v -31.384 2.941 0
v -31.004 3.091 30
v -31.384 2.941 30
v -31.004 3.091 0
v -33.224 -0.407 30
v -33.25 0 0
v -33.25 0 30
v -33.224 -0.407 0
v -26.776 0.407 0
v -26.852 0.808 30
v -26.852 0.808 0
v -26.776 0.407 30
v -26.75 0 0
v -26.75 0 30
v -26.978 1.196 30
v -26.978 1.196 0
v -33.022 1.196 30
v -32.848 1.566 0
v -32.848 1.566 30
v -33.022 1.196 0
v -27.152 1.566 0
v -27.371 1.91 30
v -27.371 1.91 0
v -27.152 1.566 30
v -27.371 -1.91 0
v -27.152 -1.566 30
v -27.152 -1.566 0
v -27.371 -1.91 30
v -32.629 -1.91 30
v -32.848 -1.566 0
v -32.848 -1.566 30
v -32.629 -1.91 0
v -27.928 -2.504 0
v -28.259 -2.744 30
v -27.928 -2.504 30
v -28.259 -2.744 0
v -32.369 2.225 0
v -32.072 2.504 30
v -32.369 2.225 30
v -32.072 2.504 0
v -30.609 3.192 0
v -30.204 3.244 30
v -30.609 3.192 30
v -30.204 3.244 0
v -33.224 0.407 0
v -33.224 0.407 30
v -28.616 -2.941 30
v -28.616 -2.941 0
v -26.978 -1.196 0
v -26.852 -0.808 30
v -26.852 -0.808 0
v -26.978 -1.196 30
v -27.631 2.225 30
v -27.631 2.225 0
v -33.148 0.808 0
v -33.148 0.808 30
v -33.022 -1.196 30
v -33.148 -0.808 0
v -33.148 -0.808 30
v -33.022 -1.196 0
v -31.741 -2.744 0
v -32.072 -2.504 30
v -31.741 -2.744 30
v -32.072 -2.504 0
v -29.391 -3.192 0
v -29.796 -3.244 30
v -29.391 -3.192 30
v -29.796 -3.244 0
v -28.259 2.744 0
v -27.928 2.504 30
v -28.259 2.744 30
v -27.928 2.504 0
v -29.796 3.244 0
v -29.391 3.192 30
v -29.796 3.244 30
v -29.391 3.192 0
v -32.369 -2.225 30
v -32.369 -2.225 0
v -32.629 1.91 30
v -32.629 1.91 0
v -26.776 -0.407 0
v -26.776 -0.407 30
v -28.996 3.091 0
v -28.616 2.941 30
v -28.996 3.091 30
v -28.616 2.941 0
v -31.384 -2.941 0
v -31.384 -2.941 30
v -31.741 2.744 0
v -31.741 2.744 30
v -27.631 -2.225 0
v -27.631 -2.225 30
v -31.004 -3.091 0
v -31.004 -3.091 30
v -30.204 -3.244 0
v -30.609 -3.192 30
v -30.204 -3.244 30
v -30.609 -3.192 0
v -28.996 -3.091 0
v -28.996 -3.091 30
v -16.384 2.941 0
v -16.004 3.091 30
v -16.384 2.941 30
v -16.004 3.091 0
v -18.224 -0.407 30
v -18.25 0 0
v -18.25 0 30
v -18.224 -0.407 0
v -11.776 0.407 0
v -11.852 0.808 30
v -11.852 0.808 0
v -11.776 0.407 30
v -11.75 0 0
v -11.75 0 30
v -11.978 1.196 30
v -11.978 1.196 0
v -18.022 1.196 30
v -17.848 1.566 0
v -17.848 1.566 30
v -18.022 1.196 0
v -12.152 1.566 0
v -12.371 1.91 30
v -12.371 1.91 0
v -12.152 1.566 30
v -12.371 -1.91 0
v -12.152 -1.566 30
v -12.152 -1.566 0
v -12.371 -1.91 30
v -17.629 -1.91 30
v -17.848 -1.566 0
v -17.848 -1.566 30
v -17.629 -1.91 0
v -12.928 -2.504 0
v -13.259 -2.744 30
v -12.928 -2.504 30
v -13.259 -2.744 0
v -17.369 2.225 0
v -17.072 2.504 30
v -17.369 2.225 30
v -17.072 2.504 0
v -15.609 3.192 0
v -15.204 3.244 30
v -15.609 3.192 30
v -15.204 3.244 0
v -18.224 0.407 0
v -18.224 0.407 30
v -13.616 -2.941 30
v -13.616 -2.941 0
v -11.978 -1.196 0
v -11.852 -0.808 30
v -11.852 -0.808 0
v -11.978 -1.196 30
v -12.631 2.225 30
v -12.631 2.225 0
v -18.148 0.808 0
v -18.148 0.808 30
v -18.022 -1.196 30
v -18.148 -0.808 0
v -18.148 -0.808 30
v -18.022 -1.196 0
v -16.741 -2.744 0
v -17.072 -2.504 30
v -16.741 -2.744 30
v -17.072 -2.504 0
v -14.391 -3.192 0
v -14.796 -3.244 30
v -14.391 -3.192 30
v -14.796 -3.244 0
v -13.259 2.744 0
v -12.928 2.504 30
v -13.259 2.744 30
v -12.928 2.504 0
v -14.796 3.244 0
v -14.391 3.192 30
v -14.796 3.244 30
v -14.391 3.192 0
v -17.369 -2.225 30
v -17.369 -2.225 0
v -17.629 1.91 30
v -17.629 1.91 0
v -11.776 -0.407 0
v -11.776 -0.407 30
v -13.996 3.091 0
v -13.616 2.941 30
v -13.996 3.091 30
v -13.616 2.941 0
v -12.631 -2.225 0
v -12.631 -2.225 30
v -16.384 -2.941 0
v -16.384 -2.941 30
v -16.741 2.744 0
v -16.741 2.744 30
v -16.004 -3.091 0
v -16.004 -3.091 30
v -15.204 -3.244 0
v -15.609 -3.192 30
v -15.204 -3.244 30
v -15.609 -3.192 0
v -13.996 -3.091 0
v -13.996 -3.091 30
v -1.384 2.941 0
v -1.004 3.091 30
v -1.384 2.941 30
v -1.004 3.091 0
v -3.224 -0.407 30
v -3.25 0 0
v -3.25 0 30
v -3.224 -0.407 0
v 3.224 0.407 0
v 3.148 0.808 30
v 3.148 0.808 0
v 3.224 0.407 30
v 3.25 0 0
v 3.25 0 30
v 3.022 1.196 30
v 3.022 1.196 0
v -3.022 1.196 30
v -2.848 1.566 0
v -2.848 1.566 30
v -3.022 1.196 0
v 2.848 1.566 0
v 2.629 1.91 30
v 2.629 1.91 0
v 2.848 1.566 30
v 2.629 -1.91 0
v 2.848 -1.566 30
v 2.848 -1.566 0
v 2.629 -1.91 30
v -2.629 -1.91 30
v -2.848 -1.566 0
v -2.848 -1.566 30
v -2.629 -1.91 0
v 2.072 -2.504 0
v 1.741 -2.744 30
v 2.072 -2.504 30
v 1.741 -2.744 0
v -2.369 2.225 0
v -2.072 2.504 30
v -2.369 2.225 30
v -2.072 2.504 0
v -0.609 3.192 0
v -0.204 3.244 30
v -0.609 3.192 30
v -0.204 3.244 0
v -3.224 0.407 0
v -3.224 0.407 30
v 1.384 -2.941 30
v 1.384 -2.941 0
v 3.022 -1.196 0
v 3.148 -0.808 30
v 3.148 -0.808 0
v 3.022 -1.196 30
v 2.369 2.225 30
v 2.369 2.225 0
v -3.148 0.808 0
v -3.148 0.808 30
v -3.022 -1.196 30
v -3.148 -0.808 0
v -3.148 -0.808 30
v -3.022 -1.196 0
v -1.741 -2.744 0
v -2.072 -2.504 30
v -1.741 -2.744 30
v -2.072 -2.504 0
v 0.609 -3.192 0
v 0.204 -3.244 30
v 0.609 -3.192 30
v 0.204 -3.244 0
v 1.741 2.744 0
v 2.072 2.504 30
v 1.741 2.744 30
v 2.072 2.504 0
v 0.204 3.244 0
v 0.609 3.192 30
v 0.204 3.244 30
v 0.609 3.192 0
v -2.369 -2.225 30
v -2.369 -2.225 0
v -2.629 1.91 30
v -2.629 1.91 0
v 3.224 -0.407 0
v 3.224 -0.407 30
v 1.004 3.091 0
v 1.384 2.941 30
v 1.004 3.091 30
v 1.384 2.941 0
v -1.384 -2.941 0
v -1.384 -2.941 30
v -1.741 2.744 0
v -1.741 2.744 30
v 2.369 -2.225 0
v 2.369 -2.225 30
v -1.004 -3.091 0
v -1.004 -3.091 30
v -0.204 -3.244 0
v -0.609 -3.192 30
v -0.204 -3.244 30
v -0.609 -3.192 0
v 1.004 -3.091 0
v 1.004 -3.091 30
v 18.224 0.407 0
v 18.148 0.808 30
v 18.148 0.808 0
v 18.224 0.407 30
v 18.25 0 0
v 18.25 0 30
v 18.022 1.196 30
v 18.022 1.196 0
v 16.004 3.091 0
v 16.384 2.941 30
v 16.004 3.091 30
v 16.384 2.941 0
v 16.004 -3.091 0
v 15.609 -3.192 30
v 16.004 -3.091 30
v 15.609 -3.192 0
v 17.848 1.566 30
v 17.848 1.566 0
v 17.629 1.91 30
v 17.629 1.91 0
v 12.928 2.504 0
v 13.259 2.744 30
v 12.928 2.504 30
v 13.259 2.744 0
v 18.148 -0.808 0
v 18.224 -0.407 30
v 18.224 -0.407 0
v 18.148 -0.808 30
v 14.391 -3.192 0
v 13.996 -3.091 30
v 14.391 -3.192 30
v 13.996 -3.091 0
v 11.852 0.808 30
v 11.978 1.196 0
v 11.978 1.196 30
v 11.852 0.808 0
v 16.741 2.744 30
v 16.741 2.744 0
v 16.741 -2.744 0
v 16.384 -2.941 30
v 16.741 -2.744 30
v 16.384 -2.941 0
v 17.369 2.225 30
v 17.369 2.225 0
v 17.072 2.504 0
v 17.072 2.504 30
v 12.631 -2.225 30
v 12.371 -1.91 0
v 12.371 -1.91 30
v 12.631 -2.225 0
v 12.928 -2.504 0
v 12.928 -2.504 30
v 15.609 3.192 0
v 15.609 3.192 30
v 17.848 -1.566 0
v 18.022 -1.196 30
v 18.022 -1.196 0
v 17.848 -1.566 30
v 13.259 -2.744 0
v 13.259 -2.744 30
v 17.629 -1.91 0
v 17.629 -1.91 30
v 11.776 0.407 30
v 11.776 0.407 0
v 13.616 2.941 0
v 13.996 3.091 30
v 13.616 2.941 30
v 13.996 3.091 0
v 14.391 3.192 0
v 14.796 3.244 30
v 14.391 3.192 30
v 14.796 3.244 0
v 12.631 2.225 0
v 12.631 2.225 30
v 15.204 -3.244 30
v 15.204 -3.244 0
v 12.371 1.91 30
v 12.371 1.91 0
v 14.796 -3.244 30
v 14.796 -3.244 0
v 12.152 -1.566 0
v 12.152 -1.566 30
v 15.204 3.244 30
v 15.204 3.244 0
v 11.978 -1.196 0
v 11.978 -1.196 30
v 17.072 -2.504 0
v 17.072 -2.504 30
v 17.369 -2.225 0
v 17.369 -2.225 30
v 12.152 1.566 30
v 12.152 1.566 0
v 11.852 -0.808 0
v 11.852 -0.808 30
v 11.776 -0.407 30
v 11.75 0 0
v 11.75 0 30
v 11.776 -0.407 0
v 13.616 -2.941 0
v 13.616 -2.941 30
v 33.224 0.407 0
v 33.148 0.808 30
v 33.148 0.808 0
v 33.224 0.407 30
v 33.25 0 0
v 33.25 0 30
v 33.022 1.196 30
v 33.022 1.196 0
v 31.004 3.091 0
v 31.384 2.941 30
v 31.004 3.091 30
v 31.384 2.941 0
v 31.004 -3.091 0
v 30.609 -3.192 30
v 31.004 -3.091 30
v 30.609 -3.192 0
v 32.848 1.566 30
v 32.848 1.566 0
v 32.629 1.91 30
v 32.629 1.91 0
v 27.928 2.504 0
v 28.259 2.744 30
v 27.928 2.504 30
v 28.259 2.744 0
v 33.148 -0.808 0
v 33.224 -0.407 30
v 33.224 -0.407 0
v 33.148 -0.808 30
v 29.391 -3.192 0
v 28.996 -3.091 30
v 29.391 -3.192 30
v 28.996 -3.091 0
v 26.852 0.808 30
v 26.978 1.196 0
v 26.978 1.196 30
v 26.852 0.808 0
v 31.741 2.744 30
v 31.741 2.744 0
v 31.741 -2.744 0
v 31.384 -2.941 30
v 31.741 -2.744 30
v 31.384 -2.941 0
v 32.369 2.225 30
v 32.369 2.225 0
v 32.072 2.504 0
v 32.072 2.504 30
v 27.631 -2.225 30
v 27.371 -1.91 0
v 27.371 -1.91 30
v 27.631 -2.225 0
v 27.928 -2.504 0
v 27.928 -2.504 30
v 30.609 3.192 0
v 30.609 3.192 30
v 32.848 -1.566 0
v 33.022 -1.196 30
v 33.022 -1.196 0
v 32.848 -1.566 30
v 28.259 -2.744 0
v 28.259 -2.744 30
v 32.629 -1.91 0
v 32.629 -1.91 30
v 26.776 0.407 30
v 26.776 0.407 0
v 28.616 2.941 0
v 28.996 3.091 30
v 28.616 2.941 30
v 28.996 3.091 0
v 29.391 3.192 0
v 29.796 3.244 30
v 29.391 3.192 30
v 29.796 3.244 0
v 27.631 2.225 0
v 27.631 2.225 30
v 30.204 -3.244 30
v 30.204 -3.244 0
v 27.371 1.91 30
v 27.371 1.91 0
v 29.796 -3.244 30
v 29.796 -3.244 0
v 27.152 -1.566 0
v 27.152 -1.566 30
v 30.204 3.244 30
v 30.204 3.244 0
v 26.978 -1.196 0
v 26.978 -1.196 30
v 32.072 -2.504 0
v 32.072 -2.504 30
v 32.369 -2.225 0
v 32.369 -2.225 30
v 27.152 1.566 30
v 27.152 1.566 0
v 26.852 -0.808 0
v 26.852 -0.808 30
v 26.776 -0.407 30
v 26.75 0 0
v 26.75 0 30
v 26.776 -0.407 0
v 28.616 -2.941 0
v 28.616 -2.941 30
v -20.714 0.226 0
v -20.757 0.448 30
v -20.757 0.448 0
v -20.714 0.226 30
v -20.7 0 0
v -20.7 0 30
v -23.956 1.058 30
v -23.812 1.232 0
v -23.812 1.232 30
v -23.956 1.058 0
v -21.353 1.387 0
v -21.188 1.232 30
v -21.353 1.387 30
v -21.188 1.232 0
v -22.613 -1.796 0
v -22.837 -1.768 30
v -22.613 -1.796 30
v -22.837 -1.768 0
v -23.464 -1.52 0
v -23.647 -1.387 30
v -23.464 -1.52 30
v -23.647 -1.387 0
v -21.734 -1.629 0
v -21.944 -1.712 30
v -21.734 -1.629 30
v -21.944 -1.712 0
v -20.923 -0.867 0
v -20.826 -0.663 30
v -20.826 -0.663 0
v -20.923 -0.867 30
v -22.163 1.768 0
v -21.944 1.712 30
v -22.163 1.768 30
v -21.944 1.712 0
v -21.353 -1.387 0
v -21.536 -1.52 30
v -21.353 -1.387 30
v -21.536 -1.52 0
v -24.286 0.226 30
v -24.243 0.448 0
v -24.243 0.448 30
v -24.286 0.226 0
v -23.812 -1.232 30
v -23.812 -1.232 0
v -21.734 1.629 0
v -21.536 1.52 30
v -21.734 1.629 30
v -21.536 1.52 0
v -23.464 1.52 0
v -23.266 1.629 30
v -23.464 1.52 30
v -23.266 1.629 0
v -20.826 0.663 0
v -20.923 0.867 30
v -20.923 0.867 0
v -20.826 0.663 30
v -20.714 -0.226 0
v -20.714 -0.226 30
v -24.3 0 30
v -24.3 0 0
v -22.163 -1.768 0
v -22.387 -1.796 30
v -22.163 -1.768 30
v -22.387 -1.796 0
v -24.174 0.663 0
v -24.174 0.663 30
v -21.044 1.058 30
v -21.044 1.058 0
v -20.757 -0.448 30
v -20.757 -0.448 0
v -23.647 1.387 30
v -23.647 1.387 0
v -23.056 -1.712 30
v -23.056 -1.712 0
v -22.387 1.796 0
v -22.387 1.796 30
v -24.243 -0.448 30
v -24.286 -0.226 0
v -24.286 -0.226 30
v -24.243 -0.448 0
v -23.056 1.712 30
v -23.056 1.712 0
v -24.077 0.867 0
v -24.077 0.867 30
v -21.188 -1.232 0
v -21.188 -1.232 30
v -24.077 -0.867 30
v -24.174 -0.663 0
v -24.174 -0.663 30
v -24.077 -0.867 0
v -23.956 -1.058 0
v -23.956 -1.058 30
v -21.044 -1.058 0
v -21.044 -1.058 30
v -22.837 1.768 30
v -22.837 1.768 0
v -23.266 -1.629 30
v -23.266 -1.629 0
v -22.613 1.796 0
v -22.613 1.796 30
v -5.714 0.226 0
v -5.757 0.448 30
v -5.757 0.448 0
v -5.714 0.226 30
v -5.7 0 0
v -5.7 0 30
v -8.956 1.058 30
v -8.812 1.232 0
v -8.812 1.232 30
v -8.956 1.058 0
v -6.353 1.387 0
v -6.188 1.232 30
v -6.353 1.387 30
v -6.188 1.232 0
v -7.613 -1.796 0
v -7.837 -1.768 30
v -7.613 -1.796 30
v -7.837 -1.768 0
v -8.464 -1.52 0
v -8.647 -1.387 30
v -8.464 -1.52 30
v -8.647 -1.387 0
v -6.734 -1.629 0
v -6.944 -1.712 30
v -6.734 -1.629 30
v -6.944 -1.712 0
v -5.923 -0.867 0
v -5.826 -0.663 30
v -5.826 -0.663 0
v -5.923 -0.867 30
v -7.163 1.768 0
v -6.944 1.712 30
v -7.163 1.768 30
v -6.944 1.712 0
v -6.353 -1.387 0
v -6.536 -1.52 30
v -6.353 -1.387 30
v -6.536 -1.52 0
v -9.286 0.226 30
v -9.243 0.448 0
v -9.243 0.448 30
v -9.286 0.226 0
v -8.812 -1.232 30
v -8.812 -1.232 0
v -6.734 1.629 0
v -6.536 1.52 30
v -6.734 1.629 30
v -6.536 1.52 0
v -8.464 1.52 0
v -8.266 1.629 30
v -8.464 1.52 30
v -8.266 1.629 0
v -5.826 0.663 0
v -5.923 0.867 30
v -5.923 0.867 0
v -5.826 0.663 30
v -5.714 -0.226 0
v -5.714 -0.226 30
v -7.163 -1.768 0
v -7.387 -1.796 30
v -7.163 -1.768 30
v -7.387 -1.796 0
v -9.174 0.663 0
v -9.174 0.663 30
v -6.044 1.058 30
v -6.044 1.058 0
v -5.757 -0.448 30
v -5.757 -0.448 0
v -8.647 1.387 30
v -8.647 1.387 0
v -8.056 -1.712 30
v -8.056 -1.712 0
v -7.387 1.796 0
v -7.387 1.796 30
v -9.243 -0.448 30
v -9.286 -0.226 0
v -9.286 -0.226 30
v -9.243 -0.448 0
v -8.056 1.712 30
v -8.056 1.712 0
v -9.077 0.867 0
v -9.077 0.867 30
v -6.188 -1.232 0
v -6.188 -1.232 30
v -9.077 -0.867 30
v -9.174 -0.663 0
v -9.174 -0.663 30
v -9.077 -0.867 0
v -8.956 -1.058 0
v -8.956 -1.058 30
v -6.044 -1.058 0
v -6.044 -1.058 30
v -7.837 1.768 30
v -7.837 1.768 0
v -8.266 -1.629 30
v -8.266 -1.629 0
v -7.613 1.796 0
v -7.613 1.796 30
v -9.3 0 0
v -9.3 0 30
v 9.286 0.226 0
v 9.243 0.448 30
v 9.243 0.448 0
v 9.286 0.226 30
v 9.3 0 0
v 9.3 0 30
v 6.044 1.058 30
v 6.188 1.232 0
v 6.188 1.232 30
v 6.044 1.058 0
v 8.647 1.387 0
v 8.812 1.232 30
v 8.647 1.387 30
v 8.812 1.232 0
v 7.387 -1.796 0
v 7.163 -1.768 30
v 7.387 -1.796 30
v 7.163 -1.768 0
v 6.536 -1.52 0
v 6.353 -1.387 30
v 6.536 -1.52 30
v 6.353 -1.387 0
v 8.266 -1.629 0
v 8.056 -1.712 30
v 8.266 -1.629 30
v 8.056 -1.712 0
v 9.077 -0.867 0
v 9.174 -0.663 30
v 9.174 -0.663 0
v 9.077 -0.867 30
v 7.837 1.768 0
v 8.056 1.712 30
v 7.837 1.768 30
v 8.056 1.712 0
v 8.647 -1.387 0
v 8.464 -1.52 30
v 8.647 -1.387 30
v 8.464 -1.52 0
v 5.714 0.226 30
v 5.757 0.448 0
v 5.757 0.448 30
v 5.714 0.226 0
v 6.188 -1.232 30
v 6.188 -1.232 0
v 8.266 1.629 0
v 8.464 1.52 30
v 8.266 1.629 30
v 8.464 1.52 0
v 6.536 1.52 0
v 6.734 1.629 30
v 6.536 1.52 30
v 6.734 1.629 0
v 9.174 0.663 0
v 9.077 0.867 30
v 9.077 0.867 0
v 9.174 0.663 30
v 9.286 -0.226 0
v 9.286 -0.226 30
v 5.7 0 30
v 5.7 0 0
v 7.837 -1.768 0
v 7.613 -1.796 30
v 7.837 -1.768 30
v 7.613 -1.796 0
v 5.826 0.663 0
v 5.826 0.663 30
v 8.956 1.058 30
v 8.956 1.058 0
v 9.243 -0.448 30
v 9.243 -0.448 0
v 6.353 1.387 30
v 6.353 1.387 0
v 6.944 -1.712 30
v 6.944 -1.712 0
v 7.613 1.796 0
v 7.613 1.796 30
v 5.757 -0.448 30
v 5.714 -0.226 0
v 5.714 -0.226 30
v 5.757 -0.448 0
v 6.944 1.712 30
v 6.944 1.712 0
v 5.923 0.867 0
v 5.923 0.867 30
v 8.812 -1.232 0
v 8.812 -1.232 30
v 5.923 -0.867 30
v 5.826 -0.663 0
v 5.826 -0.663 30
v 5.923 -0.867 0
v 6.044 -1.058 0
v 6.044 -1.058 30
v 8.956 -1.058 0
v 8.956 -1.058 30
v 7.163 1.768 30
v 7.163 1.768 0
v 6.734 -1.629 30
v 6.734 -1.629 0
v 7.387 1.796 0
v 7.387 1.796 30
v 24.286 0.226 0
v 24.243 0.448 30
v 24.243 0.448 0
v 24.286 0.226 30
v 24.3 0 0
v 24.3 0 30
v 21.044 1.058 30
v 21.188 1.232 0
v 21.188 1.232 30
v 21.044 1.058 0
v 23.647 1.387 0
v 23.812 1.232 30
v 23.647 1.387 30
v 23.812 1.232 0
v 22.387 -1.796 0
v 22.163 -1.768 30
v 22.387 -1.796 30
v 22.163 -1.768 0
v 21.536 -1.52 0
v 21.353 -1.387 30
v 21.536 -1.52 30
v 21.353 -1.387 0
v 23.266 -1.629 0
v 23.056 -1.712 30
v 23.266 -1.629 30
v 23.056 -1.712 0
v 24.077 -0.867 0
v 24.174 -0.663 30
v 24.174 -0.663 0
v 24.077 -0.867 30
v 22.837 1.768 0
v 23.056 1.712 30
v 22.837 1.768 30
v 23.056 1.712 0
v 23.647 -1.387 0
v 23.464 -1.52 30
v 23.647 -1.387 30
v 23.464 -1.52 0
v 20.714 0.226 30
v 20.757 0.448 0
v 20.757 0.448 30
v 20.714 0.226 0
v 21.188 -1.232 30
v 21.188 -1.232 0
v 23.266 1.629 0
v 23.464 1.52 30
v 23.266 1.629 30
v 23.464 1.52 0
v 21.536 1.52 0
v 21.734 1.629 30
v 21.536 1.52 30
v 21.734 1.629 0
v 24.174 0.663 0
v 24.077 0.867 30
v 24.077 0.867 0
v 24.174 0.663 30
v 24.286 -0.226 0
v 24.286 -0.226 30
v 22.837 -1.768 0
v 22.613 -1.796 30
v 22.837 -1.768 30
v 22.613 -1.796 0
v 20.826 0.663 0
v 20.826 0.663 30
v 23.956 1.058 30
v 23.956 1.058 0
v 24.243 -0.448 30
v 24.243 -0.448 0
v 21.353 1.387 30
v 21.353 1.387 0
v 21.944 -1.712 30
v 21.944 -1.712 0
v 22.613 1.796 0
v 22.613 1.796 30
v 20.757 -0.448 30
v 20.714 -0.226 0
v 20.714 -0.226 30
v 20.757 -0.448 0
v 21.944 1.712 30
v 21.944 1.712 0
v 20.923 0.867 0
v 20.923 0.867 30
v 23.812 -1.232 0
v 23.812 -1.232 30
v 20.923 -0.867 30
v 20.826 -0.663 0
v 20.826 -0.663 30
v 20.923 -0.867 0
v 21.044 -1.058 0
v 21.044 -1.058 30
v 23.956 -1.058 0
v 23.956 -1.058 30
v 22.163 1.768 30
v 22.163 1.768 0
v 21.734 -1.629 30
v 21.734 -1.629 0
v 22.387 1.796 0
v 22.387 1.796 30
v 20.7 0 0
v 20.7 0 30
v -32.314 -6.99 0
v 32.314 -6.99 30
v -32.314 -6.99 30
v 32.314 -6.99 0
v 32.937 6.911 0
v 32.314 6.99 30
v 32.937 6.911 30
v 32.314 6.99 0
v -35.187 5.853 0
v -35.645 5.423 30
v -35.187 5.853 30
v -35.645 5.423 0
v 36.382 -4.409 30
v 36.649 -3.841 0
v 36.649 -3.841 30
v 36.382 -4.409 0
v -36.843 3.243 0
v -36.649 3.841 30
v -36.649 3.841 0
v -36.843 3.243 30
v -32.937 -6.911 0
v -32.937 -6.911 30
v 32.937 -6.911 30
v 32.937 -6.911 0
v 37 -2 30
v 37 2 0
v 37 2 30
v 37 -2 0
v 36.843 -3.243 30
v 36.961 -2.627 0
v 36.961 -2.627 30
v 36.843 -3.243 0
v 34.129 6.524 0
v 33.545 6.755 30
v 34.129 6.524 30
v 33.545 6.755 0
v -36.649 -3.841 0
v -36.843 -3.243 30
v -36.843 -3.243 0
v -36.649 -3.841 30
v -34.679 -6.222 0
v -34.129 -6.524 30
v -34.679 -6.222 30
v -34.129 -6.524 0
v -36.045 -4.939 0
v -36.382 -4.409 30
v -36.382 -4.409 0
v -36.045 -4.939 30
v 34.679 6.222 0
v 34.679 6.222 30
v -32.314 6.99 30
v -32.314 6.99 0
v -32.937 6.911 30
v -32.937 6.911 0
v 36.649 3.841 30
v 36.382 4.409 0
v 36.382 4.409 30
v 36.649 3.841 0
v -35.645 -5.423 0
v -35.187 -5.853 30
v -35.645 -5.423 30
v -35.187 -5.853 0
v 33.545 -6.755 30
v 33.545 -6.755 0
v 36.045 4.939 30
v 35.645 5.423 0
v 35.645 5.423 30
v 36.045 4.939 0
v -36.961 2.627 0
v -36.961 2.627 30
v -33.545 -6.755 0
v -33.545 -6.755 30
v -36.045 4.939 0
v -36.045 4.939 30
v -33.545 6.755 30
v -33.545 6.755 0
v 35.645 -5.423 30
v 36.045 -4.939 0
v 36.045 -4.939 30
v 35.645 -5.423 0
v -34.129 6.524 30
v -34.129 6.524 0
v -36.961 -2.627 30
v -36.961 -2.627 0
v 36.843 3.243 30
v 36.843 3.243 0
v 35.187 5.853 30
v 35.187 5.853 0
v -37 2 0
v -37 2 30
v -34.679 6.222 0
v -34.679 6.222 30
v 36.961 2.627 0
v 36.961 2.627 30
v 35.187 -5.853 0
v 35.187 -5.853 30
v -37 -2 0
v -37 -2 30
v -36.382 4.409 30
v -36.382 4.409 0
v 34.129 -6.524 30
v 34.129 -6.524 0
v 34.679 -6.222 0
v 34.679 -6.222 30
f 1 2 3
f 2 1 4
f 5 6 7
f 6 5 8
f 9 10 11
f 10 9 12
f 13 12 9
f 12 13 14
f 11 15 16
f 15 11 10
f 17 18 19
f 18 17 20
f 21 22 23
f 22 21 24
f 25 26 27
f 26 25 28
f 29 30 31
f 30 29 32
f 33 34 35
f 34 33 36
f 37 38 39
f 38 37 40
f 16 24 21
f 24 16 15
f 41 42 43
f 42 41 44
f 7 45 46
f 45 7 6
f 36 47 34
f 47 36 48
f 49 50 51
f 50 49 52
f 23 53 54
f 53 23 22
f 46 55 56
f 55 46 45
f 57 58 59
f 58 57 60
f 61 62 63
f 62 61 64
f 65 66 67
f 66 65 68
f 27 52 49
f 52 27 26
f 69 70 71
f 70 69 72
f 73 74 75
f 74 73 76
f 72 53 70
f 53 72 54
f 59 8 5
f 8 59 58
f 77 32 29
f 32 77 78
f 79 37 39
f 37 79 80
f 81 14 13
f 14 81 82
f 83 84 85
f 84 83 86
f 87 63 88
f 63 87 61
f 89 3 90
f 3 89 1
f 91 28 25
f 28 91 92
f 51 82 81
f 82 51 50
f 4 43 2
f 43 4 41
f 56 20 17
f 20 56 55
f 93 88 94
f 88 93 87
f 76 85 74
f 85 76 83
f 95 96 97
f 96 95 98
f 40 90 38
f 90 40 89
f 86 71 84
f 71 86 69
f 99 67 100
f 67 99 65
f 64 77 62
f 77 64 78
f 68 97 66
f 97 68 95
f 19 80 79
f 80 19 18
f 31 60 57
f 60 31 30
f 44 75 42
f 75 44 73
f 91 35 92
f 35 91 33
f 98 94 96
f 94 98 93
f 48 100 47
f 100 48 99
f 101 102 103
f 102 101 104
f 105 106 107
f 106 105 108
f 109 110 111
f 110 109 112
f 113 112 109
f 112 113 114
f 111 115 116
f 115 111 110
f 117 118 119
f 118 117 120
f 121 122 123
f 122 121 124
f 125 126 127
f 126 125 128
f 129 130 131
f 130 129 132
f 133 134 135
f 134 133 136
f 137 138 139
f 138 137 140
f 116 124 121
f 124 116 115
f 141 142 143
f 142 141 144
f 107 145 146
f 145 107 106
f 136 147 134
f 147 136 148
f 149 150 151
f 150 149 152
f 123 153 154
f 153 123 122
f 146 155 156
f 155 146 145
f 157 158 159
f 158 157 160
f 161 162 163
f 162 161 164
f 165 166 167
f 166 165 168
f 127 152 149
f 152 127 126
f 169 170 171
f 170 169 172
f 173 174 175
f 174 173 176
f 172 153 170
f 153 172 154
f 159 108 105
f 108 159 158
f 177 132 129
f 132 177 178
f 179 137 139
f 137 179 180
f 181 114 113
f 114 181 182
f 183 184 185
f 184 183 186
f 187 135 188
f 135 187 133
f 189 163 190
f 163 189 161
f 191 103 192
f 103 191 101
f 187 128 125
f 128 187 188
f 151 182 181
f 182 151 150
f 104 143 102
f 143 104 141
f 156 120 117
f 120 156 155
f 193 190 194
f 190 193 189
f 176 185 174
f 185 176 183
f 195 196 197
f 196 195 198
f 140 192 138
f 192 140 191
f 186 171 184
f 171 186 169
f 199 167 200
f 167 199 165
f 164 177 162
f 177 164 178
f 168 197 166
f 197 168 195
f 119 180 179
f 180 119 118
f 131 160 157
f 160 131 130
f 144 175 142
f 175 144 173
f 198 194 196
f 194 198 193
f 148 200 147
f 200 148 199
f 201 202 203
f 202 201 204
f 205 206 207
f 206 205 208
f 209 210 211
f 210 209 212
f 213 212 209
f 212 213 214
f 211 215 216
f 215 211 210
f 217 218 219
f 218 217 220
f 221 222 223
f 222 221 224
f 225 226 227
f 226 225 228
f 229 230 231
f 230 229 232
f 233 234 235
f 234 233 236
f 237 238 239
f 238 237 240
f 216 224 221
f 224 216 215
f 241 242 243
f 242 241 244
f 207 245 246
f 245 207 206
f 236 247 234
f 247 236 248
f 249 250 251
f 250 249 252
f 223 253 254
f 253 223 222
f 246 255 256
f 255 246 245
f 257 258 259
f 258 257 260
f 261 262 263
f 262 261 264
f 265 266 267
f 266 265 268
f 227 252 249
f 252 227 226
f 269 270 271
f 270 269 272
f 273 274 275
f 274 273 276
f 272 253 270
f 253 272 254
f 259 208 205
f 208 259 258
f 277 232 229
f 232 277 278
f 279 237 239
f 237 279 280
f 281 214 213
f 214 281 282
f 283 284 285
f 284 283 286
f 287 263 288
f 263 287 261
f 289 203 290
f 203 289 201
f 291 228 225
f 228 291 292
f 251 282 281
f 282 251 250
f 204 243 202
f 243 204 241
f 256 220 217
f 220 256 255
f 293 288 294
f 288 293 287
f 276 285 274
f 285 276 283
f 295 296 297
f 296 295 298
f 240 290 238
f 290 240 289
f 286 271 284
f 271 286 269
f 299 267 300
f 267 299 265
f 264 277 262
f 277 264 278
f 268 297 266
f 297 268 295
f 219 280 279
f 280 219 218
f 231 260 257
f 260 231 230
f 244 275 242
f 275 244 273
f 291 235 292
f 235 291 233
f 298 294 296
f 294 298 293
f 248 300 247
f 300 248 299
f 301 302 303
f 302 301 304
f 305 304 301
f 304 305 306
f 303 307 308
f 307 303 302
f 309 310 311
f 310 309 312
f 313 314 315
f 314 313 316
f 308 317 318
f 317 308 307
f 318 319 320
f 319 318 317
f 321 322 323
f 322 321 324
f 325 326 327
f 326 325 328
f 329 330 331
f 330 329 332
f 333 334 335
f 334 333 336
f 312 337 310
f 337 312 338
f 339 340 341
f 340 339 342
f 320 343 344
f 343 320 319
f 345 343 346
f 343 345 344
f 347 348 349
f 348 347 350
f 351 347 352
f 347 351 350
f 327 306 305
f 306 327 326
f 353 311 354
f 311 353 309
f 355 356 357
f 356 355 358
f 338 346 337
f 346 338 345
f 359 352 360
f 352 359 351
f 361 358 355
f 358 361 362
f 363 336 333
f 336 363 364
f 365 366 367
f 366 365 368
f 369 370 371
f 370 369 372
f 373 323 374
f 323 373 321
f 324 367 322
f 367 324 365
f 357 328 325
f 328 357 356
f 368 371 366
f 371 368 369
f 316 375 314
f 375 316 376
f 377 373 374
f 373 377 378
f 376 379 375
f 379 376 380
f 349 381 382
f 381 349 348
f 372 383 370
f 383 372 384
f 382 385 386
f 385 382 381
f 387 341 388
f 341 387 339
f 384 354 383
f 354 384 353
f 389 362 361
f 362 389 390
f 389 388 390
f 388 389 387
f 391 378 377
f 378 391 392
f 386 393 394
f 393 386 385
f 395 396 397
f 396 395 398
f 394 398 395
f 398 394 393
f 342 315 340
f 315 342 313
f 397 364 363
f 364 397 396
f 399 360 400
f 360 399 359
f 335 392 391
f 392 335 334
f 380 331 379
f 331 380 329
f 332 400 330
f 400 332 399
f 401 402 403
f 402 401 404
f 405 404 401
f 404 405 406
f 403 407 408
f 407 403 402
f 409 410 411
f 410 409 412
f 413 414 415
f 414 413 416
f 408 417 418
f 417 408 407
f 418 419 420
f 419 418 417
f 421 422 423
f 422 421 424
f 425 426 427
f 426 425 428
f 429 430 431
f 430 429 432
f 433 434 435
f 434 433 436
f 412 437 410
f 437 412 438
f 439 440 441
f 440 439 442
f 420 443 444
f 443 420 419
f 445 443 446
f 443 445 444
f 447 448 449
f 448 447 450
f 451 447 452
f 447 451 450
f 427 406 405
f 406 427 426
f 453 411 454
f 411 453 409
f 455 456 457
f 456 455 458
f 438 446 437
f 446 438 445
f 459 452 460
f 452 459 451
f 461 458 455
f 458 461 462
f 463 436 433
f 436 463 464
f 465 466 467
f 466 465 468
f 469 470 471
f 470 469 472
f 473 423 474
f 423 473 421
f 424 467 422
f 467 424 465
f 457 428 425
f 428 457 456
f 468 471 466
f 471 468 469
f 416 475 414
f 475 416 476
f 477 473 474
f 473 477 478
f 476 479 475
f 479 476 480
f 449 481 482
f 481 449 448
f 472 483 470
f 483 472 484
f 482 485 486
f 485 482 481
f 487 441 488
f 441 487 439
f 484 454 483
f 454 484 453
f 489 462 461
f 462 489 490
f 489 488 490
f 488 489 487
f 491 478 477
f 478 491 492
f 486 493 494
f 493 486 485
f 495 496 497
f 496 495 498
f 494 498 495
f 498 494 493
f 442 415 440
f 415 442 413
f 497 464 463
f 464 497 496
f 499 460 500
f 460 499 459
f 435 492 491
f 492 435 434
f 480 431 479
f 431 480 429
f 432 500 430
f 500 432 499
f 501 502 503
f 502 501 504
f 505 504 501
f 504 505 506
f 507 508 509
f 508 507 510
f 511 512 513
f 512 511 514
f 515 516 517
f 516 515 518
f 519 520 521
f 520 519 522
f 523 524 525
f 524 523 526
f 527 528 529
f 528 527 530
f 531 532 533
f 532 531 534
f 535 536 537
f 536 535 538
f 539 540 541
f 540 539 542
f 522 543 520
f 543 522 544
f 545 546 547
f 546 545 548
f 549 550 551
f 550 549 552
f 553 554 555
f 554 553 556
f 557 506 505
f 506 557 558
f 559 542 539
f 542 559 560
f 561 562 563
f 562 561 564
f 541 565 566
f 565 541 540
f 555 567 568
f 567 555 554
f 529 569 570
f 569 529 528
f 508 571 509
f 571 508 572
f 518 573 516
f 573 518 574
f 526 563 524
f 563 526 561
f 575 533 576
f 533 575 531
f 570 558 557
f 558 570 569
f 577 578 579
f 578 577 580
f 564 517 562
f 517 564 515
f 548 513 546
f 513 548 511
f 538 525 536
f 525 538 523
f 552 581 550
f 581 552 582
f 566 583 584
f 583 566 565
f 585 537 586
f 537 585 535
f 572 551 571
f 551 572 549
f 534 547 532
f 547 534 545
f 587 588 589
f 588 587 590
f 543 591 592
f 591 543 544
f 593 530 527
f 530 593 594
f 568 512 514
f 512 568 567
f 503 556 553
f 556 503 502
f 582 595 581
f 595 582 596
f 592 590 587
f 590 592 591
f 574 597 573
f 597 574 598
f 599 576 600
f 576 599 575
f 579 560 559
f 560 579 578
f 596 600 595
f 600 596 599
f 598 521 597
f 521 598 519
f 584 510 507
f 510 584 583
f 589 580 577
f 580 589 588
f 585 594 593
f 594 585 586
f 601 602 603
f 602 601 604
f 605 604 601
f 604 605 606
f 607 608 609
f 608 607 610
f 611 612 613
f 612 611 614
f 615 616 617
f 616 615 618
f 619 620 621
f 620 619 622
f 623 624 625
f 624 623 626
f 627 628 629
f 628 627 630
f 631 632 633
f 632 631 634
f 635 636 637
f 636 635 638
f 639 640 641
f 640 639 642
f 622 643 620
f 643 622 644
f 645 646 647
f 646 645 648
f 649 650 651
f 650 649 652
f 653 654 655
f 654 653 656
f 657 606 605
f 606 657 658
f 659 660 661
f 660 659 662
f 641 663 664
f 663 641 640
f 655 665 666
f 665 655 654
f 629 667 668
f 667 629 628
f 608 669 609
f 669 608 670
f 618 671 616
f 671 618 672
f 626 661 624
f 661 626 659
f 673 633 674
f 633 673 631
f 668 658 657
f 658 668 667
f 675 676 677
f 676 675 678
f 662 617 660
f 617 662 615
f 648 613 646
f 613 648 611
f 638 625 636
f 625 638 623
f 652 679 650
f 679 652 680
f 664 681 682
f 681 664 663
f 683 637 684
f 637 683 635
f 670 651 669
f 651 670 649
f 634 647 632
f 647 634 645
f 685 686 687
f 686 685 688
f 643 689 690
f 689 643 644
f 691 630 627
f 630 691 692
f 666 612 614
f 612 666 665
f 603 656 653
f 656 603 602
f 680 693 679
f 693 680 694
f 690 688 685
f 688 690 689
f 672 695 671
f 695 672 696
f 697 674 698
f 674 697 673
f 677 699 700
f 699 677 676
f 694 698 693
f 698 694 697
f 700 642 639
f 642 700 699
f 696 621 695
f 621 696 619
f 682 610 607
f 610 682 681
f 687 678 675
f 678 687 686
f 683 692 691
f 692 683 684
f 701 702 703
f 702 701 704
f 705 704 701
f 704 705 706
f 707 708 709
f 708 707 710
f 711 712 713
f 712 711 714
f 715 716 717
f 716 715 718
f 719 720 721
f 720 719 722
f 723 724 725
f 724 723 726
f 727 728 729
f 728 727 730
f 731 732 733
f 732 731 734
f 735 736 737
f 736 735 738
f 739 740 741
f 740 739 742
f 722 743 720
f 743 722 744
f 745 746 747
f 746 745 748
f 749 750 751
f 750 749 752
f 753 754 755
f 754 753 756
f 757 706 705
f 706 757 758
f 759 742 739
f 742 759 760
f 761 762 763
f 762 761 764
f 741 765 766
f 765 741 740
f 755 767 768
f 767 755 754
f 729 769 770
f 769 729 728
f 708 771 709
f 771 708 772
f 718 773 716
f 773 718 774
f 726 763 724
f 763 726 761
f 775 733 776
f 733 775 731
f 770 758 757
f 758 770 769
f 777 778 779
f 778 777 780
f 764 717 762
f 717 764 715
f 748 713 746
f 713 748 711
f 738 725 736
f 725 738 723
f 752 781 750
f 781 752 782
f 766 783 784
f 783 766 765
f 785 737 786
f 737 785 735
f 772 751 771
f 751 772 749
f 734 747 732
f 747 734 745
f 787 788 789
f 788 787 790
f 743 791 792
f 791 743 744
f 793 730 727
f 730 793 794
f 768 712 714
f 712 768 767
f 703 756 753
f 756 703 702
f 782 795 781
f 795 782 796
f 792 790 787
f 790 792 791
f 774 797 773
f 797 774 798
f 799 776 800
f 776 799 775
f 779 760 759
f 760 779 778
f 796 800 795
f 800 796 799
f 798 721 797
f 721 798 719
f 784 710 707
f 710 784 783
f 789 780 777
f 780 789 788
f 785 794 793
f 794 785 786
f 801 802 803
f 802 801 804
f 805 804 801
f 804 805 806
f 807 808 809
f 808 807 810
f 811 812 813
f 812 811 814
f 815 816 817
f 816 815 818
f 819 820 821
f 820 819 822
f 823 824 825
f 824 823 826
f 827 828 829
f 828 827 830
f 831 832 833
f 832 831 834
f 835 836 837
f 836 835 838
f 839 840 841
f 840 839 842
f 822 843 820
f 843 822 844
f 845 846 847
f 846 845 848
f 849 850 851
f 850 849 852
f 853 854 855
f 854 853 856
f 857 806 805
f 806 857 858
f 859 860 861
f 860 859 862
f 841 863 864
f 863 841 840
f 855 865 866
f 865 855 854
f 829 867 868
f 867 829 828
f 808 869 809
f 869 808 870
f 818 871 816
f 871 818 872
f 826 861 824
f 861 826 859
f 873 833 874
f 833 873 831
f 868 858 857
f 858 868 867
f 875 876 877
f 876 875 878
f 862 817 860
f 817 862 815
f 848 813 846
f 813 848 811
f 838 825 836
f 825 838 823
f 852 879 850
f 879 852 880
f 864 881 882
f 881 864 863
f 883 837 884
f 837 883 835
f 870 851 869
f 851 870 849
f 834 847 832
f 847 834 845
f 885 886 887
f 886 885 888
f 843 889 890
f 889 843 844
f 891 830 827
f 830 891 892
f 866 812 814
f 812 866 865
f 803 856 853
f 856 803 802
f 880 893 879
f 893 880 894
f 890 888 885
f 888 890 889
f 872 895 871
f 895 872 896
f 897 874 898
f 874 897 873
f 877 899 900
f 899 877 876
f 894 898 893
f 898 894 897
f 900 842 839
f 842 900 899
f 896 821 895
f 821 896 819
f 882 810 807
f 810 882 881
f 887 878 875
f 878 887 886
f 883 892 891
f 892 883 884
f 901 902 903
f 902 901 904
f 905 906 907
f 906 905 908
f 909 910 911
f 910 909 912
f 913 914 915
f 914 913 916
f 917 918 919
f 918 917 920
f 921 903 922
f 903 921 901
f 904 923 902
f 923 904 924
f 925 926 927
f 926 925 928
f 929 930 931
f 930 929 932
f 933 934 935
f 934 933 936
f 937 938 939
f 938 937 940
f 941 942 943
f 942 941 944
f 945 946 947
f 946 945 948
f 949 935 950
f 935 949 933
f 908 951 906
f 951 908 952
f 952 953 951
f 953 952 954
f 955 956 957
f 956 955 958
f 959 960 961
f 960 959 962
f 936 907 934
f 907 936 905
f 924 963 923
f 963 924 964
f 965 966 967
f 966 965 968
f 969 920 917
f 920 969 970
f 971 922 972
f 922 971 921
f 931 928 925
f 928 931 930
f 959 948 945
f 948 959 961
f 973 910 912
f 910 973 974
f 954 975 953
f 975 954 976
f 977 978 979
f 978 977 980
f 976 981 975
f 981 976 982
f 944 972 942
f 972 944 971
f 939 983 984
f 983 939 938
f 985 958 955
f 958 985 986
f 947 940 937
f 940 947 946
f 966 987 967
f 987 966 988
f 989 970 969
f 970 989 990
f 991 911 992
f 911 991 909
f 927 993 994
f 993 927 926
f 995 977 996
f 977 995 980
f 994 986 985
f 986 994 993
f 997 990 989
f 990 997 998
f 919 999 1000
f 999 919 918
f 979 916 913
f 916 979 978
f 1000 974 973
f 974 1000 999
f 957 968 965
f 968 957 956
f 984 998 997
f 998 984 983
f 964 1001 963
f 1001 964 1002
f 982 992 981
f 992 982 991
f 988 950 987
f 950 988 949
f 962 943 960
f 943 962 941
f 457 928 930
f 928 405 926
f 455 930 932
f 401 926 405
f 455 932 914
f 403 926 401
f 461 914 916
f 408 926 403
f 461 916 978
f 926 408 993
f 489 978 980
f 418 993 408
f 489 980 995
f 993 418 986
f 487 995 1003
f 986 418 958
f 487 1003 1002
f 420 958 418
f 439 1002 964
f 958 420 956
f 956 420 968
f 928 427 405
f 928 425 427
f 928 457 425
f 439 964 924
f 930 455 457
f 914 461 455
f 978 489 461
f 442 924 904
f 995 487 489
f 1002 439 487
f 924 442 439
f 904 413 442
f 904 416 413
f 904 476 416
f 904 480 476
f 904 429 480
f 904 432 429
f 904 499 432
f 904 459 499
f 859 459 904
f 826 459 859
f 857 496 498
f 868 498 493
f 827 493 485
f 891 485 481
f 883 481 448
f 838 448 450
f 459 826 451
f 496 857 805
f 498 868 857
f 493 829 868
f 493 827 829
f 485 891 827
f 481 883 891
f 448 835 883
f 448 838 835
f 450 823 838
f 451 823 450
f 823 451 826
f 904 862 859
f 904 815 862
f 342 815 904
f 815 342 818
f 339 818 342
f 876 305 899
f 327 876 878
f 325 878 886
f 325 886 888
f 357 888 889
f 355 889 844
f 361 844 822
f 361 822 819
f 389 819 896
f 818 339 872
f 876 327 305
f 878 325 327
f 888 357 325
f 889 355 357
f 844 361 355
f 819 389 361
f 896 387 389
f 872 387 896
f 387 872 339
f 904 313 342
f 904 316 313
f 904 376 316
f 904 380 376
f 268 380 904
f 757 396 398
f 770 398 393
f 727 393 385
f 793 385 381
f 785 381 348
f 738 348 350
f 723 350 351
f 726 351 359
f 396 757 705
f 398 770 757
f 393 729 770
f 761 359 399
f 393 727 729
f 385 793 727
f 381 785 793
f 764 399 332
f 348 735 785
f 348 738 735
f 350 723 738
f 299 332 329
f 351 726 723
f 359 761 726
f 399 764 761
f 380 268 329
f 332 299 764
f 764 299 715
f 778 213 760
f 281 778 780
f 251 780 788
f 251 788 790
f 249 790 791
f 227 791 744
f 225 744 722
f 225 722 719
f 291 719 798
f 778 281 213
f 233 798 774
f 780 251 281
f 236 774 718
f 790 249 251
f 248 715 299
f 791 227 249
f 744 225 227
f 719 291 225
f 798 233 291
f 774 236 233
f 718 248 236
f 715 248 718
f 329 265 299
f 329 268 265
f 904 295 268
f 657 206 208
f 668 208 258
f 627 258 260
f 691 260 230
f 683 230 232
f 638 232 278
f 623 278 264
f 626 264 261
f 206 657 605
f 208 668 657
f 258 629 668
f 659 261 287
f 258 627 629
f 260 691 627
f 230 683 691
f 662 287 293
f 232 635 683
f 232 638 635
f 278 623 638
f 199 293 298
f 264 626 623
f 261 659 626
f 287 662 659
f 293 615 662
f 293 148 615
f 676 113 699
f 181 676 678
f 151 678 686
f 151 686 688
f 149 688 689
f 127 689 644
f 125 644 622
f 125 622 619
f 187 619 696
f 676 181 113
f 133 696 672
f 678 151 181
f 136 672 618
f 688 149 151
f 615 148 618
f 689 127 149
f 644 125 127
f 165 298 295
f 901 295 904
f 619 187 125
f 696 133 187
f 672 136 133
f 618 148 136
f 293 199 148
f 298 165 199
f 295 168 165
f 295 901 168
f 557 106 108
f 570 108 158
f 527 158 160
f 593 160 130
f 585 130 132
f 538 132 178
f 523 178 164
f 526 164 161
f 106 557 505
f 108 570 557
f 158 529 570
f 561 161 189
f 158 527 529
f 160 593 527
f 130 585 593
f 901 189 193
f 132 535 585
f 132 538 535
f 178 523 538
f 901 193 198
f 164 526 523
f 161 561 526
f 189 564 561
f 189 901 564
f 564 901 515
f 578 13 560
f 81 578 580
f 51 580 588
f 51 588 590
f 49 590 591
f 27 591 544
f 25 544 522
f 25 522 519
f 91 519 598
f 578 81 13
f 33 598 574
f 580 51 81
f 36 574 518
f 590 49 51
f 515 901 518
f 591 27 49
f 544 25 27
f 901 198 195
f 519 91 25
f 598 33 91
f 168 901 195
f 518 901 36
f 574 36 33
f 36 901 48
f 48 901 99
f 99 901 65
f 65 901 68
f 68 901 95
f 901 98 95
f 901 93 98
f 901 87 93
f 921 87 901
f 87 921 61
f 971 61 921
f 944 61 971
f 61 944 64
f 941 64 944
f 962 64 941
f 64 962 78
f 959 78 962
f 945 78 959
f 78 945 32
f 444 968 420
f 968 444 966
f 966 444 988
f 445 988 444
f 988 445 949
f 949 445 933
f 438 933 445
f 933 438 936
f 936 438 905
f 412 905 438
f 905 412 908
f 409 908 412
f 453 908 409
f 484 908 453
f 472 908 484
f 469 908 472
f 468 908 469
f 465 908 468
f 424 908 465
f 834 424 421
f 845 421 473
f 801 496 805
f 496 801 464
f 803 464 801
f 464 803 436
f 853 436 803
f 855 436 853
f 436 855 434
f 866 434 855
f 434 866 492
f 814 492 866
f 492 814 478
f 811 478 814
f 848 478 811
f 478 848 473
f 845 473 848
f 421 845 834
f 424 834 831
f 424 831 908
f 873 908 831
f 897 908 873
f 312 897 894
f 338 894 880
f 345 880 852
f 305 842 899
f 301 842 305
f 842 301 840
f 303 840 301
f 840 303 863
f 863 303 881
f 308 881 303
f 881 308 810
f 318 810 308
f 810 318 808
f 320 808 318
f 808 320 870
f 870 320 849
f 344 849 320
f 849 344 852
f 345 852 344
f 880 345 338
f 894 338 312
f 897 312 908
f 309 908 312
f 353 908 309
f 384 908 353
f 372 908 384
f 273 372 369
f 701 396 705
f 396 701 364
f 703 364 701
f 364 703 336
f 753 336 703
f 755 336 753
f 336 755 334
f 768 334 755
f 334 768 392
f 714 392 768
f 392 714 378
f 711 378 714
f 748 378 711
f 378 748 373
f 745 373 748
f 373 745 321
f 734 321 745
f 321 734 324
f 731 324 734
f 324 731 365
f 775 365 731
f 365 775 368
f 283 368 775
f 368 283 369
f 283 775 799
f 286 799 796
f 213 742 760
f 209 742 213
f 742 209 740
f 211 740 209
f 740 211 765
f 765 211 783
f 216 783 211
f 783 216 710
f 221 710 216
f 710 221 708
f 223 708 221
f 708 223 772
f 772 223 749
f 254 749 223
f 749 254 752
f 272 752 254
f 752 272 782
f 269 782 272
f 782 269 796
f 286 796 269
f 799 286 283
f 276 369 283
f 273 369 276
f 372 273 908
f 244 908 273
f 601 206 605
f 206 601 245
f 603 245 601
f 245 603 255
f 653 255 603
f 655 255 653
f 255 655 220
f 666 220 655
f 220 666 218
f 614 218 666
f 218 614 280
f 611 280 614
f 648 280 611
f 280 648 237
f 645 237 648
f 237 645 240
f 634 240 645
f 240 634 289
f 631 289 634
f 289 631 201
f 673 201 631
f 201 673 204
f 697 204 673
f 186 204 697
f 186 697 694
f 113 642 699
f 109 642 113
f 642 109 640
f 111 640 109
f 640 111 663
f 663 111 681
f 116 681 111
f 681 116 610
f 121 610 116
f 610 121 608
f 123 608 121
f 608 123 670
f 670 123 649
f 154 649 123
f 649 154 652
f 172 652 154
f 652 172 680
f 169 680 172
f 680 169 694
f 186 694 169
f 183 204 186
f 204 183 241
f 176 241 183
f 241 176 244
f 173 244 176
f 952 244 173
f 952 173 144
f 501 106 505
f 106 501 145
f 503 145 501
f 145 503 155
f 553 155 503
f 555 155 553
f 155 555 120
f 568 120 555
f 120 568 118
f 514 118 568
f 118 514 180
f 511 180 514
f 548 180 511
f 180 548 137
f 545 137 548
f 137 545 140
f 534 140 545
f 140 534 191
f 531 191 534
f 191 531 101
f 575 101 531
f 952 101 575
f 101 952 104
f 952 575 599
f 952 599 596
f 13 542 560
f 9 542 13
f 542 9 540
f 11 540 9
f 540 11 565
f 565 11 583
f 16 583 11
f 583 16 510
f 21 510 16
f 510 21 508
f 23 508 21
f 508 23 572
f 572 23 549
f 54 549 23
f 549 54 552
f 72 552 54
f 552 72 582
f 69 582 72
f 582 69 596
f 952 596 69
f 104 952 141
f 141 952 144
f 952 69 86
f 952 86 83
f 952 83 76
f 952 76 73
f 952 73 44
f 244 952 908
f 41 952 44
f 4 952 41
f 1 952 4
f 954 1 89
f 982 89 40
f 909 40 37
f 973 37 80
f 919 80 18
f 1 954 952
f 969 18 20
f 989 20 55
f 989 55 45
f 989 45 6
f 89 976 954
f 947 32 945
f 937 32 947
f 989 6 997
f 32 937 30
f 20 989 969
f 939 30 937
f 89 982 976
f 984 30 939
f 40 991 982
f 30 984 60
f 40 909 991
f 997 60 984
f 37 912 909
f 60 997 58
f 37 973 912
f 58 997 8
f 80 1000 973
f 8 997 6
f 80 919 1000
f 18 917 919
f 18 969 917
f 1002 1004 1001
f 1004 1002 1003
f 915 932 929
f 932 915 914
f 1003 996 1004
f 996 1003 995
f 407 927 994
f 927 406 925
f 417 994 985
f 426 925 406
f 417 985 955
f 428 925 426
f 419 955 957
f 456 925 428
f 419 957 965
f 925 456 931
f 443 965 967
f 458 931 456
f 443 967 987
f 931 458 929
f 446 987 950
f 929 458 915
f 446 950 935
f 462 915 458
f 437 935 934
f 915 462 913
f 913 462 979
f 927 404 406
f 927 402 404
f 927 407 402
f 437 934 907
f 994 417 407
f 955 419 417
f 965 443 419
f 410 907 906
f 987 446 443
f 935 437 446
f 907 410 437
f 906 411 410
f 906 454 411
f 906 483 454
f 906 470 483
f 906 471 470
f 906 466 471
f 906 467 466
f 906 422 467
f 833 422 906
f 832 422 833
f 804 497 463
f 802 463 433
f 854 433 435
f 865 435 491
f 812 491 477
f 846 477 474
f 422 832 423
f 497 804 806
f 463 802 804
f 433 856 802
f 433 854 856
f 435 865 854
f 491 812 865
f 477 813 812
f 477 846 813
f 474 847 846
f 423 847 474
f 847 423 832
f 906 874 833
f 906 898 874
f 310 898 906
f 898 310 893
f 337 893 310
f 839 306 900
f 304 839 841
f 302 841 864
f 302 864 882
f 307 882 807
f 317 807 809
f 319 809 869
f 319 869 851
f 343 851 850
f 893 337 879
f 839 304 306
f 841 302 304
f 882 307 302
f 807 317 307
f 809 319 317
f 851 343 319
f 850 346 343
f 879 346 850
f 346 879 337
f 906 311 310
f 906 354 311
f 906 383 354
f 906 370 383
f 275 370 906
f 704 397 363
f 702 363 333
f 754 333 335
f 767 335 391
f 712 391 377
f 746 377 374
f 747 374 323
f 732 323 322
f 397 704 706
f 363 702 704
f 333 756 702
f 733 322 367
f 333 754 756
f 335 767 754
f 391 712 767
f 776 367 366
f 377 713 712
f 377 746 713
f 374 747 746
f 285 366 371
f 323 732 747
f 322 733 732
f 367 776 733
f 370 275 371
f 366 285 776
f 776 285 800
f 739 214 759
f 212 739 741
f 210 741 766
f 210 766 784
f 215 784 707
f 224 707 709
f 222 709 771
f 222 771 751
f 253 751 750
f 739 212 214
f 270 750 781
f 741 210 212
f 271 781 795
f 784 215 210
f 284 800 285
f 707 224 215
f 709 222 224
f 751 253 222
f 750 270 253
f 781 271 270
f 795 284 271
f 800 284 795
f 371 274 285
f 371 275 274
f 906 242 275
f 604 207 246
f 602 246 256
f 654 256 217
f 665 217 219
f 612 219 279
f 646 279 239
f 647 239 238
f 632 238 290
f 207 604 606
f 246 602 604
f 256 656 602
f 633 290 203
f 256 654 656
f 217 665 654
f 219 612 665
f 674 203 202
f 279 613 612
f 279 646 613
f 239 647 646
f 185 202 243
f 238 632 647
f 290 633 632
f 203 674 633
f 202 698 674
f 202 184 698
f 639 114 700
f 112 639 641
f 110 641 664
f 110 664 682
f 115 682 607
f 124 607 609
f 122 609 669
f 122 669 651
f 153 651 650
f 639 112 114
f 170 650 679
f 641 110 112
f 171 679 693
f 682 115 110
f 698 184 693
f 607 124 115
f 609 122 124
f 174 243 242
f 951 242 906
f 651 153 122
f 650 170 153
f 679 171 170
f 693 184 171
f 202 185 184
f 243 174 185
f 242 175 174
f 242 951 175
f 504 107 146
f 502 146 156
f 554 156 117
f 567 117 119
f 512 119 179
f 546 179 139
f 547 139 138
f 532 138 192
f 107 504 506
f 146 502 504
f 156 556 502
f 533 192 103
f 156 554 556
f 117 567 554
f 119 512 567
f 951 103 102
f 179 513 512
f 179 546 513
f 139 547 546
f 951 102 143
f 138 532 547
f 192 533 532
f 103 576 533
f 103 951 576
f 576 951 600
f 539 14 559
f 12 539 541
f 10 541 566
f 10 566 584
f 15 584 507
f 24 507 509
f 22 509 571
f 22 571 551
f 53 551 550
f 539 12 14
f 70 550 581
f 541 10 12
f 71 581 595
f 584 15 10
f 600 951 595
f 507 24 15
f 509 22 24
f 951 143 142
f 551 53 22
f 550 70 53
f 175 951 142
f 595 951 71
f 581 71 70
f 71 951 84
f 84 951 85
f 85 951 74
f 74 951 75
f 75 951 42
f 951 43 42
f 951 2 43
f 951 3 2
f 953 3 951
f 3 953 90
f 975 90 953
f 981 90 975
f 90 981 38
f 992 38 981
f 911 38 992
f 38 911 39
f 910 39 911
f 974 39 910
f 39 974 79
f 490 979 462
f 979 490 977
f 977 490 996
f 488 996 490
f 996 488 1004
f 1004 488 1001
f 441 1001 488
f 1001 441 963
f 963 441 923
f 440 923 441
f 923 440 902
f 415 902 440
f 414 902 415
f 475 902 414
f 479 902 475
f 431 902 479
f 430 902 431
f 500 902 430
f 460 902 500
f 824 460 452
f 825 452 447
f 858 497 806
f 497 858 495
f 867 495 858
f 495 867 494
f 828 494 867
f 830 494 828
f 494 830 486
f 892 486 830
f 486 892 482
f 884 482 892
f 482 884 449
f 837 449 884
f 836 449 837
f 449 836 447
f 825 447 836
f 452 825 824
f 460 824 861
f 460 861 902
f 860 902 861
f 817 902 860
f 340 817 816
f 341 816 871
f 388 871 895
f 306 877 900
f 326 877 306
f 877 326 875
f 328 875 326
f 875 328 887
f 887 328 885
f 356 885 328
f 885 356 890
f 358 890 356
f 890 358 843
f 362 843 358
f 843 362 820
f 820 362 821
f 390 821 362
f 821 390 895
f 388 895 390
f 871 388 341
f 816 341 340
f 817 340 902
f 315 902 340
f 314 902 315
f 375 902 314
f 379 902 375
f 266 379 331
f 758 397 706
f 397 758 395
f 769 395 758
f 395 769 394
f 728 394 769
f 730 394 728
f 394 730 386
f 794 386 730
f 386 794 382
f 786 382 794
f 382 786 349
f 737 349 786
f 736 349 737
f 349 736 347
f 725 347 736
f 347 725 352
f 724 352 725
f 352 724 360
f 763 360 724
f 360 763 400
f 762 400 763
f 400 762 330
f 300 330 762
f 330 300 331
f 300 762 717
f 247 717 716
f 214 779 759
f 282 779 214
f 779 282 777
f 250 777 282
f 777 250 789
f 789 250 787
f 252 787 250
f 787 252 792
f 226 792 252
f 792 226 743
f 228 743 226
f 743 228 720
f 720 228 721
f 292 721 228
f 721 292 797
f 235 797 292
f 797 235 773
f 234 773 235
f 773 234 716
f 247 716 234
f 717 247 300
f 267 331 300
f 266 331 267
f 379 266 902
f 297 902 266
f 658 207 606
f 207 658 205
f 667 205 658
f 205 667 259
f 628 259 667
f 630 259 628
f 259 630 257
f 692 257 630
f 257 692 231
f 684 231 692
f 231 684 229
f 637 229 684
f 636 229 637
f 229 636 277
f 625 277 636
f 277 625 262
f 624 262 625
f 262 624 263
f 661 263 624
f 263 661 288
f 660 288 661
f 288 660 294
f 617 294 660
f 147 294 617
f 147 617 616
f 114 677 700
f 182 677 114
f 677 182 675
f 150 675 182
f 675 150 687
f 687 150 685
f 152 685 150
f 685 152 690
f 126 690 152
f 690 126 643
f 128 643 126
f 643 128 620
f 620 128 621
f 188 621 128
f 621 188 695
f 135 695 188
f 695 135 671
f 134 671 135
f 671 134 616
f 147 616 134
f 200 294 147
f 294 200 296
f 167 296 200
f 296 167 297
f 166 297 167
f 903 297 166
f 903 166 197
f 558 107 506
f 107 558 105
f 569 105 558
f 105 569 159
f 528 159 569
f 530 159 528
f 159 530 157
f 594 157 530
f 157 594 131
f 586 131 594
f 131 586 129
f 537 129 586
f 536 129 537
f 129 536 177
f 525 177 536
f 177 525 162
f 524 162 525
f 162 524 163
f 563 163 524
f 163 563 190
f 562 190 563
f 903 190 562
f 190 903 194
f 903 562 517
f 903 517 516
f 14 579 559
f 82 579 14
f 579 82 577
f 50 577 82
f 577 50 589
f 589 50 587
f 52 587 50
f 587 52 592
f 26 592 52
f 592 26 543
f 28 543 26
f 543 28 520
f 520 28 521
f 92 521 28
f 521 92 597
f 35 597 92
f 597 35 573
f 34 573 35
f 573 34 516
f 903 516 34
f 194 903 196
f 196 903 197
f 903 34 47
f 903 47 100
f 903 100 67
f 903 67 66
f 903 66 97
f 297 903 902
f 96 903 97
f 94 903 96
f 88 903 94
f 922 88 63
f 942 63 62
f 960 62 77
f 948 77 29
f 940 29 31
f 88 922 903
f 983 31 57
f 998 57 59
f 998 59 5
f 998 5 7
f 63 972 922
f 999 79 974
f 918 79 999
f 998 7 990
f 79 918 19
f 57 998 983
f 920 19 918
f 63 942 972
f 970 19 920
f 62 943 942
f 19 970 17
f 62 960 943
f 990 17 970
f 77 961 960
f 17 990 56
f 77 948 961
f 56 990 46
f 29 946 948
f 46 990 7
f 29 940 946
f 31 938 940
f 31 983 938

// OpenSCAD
$fn = 50;


difference() {
	union() {
		*color(alpha = 1.0000000000, c = "gray") {
			translate(v = [0, 7, 0]) {
				linear_extrude(height = 1) {
					text(font = "Arial:style=Bold", halign = "center", size = 4.5000000000, text = "COMMENT plate main", valign = "center");
				}
			}
		}
		hull() {
			translate(v = [-32.0000000000, 2.0000000000, 0]) {
				cylinder(h = 30, r = 5);
			}
			translate(v = [32.0000000000, 2.0000000000, 0]) {
				cylinder(h = 30, r = 5);
			}
			translate(v = [-32.0000000000, -2.0000000000, 0]) {
				cylinder(h = 30, r = 5);
			}
			translate(v = [32.0000000000, -2.0000000000, 0]) {
				cylinder(h = 30, r = 5);
			}
		}
	}
	union() {
		*color(alpha = 1.0000000000, c = "gray") {
			translate(v = [0, 7, 0]) {
				linear_extrude(height = 1) {
					text(font = "Arial:style=Bold", halign = "center", size = 4.5000000000, text = "COMMENT holes main", valign = "center");
				}
			}
		}
		translate(v = [-30.0000000000, 0.0000000000, 0]) {
			translate(v = [0, 0, -100]) {
				cylinder(h = 200, r = 3.2500000000);
			}
		}
		translate(v = [-15.0000000000, 0.0000000000, 0]) {
			translate(v = [0, 0, -100]) {
				cylinder(h = 200, r = 3.2500000000);
			}
		}
		translate(v = [0, 0, -100]) {
			cylinder(h = 200, r = 3.2500000000);
		}
		translate(v = [15.0000000000, 0.0000000000, 0]) {
			translate(v = [0, 0, -100]) {
				cylinder(h = 200, r = 3.2500000000);
			}
		}
		translate(v = [30.0000000000, 0.0000000000, 0]) {
			translate(v = [0, 0, -100]) {
				cylinder(h = 200, r = 3.2500000000);
			}
		}
		translate(v = [-30.0000000000, 0.0000000000, 0]) {
			translate(v = [0, 0, -100]) {
				cylinder(h = 200, r = 1.8000000000);
			}
		}
		translate(v = [-22.5000000000, 0.0000000000, 0]) {
			translate(v = [0, 0, -100]) {
				cylinder(h = 200, r = 1.8000000000);
			}
		}
		translate(v = [-15.0000000000, 0.0000000000, 0]) {
			translate(v = [0, 0, -100]) {
				cylinder(h = 200, r = 1.8000000000);
			}
		}
		translate(v = [-7.5000000000, 0.0000000000, 0]) {
			translate(v = [0, 0, -100]) {
				cylinder(h = 200, r = 1.8000000000);
			}
		}
		translate(v = [0, 0, -100]) {
			cylinder(h = 200, r = 1.8000000000);
		}
		translate(v = [7.5000000000, 0.0000000000, 0]) {
			translate(v = [0, 0, -100]) {
				cylinder(h = 200, r = 1.8000000000);
			}
		}
		translate(v = [15.0000000000, 0.0000000000, 0]) {
			translate(v = [0, 0, -100]) {
				cylinder(h = 200, r = 1.8000000000);
			}
		}
		translate(v = [22.5000000000, 0.0000000000, 0]) {
			translate(v = [0, 0, -100]) {
				cylinder(h = 200, r = 1.8000000000);
			}
		}
		translate(v = [30.0000000000, 0.0000000000, 0]) {
			translate(v = [0, 0, -100]) {
				cylinder(h = 200, r = 1.8000000000);
			}
		}
	}
}
